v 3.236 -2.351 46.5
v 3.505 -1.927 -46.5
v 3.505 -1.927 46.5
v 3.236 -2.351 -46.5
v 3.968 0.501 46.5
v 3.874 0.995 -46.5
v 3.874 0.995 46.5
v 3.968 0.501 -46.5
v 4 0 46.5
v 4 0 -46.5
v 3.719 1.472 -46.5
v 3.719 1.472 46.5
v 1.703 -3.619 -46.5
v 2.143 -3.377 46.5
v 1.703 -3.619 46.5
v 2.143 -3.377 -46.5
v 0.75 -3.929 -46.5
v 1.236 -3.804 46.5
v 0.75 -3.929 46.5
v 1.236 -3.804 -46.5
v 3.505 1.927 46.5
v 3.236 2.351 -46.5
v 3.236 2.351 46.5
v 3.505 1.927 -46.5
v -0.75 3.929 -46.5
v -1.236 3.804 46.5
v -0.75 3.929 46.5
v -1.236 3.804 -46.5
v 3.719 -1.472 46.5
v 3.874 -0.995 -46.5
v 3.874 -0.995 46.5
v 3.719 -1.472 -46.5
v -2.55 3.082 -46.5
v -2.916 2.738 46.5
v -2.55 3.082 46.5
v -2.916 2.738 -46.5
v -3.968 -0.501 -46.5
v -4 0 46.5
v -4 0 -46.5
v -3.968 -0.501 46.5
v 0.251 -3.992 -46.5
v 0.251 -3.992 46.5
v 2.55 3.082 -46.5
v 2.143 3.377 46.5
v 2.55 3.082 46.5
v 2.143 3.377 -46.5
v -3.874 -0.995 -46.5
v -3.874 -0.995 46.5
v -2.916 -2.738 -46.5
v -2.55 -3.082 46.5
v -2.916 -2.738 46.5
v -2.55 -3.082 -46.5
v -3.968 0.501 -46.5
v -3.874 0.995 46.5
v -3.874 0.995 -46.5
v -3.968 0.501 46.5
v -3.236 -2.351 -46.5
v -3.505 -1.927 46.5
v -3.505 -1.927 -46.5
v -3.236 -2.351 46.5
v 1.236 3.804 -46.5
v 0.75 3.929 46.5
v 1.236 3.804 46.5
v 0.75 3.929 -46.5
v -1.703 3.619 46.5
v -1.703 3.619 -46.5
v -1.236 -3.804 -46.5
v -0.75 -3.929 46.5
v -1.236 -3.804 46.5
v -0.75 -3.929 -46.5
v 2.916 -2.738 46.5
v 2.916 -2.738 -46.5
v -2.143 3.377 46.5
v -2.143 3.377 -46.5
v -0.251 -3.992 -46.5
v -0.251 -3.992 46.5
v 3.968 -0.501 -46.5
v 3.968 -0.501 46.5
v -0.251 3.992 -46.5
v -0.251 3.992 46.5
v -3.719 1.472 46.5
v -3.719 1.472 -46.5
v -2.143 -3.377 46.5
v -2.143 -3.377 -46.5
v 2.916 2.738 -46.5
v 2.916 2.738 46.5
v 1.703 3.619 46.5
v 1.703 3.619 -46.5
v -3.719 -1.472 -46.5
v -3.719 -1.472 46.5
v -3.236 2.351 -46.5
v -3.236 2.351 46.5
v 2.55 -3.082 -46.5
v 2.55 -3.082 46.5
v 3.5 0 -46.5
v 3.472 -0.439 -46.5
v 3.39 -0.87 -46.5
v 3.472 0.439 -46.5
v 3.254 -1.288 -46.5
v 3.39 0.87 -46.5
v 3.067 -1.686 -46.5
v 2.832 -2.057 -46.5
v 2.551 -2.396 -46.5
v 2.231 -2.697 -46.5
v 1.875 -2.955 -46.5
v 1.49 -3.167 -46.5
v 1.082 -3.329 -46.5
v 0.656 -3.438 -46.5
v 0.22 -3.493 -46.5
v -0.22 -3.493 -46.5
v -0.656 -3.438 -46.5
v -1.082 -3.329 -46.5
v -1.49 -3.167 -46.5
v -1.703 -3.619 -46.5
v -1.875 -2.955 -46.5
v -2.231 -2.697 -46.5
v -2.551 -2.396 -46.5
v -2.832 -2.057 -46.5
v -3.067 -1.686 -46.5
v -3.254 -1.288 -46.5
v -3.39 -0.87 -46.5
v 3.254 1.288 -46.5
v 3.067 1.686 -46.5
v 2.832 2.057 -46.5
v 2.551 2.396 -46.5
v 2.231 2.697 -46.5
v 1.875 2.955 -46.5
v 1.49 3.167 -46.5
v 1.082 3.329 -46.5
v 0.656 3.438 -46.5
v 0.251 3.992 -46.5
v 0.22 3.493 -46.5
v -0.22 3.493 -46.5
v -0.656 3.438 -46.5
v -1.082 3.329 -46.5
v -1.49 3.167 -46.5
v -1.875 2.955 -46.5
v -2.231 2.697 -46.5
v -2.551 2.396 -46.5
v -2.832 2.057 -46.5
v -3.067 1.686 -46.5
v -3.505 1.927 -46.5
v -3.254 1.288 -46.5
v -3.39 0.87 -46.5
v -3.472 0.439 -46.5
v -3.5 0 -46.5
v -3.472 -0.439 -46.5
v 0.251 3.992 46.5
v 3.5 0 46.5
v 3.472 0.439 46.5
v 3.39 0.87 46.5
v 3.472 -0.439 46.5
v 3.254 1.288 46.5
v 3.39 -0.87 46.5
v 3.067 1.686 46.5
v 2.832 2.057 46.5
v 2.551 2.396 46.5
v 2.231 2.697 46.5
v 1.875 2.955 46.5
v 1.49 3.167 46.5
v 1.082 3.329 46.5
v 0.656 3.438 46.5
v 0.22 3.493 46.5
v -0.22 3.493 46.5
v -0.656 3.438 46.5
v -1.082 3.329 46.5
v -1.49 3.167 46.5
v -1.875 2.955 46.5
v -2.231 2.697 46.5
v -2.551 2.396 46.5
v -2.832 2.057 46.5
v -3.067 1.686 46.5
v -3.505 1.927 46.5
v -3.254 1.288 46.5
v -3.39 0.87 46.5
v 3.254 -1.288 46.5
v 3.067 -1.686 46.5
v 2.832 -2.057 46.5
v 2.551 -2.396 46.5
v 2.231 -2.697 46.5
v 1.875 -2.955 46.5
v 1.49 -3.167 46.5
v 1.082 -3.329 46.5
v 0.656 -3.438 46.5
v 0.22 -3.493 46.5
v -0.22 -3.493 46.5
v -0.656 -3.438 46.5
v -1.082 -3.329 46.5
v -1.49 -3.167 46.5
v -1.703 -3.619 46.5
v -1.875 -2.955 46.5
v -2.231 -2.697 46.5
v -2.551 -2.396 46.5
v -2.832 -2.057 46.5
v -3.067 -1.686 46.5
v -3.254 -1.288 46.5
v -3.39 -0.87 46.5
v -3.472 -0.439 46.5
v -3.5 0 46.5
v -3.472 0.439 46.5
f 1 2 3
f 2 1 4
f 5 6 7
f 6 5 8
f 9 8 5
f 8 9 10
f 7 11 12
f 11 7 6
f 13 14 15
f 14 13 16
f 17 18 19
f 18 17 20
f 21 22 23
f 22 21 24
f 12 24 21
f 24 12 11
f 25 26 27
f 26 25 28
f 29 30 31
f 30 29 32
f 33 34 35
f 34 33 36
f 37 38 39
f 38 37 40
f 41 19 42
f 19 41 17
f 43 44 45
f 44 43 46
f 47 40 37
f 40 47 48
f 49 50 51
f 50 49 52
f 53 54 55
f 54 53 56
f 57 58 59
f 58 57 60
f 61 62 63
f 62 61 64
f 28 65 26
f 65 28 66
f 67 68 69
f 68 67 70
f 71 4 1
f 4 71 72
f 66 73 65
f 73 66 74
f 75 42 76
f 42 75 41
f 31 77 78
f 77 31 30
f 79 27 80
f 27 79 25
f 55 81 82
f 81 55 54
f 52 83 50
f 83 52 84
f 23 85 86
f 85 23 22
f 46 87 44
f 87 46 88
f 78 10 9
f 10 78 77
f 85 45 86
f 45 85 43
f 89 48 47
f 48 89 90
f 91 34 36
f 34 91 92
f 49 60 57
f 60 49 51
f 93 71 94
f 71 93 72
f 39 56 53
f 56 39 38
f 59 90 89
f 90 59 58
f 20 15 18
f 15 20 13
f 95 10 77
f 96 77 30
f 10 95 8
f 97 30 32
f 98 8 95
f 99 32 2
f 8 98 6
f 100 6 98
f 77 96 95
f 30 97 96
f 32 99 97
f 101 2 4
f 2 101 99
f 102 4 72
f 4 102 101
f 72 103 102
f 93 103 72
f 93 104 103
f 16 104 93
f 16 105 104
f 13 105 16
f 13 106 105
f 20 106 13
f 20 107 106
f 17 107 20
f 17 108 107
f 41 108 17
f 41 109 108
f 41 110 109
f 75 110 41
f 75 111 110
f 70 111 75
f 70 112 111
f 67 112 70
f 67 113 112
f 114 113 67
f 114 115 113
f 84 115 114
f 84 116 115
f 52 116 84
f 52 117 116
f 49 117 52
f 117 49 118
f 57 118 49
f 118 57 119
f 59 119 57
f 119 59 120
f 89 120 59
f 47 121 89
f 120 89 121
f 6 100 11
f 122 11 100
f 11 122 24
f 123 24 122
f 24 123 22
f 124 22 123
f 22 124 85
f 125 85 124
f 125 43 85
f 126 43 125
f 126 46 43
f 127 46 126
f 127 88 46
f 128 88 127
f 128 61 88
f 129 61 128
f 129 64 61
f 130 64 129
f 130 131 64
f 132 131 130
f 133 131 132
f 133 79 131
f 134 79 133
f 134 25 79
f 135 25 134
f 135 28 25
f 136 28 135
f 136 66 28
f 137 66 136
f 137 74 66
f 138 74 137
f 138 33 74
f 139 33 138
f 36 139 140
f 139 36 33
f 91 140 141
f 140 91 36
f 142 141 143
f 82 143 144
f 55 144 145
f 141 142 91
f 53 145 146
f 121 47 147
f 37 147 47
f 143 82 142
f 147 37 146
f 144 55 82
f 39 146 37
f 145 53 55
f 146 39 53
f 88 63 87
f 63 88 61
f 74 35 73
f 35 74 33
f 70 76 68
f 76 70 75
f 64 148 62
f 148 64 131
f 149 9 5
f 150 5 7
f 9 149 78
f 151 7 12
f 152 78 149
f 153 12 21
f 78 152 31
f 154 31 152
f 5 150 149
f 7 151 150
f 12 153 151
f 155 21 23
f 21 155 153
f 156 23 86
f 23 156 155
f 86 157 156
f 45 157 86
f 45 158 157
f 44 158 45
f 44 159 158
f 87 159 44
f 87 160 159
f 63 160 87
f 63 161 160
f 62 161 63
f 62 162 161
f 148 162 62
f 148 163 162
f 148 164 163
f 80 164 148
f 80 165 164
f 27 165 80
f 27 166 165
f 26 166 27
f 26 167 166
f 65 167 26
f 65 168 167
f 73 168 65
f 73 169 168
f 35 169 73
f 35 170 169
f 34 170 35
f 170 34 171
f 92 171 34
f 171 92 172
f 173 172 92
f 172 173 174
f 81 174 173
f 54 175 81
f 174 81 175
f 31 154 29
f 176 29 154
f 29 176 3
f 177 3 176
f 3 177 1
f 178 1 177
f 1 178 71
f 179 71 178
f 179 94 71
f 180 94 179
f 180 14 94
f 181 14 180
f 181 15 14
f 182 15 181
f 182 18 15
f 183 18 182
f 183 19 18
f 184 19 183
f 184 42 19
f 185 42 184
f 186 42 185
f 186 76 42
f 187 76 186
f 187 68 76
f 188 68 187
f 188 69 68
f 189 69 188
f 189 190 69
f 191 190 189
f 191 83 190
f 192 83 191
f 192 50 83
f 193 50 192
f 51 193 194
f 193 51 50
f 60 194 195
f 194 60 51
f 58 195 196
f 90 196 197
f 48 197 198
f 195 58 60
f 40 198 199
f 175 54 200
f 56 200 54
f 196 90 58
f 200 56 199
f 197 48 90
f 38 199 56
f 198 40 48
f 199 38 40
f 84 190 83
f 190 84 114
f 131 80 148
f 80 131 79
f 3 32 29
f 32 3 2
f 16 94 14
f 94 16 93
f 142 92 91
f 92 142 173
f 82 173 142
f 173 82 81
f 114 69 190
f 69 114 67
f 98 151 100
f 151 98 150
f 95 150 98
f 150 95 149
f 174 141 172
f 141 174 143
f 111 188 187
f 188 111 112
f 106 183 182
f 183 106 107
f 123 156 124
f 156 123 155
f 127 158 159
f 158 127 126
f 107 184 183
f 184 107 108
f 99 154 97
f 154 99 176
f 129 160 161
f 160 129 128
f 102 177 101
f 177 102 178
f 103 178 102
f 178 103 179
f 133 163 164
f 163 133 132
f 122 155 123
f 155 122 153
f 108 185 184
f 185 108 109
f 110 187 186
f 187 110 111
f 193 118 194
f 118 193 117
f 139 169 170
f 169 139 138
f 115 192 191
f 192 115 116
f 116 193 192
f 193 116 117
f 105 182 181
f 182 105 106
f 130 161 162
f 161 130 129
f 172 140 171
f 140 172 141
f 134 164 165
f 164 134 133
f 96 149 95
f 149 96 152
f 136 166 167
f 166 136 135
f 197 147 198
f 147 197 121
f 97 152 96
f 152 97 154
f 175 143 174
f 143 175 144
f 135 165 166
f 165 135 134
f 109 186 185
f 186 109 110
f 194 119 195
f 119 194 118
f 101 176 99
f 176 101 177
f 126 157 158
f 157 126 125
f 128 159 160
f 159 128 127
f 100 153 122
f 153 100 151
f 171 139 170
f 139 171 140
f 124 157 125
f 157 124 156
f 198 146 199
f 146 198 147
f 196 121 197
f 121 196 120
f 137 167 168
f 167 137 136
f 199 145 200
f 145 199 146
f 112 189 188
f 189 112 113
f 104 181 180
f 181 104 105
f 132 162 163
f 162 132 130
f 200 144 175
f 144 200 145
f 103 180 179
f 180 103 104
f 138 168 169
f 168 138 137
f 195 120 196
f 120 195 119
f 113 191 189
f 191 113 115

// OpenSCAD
$fn = 50;


difference() {
	union() {
		translate(v = [0, 0, -46.5000000000]) {
			cylinder(h = 93, r = 4.0000000000);
		}
	}
	union() {
		translate(v = [0, 0, -100.0000000000]) {
			cylinder(h = 200, r = 3.5000000000);
		}
	}
}
